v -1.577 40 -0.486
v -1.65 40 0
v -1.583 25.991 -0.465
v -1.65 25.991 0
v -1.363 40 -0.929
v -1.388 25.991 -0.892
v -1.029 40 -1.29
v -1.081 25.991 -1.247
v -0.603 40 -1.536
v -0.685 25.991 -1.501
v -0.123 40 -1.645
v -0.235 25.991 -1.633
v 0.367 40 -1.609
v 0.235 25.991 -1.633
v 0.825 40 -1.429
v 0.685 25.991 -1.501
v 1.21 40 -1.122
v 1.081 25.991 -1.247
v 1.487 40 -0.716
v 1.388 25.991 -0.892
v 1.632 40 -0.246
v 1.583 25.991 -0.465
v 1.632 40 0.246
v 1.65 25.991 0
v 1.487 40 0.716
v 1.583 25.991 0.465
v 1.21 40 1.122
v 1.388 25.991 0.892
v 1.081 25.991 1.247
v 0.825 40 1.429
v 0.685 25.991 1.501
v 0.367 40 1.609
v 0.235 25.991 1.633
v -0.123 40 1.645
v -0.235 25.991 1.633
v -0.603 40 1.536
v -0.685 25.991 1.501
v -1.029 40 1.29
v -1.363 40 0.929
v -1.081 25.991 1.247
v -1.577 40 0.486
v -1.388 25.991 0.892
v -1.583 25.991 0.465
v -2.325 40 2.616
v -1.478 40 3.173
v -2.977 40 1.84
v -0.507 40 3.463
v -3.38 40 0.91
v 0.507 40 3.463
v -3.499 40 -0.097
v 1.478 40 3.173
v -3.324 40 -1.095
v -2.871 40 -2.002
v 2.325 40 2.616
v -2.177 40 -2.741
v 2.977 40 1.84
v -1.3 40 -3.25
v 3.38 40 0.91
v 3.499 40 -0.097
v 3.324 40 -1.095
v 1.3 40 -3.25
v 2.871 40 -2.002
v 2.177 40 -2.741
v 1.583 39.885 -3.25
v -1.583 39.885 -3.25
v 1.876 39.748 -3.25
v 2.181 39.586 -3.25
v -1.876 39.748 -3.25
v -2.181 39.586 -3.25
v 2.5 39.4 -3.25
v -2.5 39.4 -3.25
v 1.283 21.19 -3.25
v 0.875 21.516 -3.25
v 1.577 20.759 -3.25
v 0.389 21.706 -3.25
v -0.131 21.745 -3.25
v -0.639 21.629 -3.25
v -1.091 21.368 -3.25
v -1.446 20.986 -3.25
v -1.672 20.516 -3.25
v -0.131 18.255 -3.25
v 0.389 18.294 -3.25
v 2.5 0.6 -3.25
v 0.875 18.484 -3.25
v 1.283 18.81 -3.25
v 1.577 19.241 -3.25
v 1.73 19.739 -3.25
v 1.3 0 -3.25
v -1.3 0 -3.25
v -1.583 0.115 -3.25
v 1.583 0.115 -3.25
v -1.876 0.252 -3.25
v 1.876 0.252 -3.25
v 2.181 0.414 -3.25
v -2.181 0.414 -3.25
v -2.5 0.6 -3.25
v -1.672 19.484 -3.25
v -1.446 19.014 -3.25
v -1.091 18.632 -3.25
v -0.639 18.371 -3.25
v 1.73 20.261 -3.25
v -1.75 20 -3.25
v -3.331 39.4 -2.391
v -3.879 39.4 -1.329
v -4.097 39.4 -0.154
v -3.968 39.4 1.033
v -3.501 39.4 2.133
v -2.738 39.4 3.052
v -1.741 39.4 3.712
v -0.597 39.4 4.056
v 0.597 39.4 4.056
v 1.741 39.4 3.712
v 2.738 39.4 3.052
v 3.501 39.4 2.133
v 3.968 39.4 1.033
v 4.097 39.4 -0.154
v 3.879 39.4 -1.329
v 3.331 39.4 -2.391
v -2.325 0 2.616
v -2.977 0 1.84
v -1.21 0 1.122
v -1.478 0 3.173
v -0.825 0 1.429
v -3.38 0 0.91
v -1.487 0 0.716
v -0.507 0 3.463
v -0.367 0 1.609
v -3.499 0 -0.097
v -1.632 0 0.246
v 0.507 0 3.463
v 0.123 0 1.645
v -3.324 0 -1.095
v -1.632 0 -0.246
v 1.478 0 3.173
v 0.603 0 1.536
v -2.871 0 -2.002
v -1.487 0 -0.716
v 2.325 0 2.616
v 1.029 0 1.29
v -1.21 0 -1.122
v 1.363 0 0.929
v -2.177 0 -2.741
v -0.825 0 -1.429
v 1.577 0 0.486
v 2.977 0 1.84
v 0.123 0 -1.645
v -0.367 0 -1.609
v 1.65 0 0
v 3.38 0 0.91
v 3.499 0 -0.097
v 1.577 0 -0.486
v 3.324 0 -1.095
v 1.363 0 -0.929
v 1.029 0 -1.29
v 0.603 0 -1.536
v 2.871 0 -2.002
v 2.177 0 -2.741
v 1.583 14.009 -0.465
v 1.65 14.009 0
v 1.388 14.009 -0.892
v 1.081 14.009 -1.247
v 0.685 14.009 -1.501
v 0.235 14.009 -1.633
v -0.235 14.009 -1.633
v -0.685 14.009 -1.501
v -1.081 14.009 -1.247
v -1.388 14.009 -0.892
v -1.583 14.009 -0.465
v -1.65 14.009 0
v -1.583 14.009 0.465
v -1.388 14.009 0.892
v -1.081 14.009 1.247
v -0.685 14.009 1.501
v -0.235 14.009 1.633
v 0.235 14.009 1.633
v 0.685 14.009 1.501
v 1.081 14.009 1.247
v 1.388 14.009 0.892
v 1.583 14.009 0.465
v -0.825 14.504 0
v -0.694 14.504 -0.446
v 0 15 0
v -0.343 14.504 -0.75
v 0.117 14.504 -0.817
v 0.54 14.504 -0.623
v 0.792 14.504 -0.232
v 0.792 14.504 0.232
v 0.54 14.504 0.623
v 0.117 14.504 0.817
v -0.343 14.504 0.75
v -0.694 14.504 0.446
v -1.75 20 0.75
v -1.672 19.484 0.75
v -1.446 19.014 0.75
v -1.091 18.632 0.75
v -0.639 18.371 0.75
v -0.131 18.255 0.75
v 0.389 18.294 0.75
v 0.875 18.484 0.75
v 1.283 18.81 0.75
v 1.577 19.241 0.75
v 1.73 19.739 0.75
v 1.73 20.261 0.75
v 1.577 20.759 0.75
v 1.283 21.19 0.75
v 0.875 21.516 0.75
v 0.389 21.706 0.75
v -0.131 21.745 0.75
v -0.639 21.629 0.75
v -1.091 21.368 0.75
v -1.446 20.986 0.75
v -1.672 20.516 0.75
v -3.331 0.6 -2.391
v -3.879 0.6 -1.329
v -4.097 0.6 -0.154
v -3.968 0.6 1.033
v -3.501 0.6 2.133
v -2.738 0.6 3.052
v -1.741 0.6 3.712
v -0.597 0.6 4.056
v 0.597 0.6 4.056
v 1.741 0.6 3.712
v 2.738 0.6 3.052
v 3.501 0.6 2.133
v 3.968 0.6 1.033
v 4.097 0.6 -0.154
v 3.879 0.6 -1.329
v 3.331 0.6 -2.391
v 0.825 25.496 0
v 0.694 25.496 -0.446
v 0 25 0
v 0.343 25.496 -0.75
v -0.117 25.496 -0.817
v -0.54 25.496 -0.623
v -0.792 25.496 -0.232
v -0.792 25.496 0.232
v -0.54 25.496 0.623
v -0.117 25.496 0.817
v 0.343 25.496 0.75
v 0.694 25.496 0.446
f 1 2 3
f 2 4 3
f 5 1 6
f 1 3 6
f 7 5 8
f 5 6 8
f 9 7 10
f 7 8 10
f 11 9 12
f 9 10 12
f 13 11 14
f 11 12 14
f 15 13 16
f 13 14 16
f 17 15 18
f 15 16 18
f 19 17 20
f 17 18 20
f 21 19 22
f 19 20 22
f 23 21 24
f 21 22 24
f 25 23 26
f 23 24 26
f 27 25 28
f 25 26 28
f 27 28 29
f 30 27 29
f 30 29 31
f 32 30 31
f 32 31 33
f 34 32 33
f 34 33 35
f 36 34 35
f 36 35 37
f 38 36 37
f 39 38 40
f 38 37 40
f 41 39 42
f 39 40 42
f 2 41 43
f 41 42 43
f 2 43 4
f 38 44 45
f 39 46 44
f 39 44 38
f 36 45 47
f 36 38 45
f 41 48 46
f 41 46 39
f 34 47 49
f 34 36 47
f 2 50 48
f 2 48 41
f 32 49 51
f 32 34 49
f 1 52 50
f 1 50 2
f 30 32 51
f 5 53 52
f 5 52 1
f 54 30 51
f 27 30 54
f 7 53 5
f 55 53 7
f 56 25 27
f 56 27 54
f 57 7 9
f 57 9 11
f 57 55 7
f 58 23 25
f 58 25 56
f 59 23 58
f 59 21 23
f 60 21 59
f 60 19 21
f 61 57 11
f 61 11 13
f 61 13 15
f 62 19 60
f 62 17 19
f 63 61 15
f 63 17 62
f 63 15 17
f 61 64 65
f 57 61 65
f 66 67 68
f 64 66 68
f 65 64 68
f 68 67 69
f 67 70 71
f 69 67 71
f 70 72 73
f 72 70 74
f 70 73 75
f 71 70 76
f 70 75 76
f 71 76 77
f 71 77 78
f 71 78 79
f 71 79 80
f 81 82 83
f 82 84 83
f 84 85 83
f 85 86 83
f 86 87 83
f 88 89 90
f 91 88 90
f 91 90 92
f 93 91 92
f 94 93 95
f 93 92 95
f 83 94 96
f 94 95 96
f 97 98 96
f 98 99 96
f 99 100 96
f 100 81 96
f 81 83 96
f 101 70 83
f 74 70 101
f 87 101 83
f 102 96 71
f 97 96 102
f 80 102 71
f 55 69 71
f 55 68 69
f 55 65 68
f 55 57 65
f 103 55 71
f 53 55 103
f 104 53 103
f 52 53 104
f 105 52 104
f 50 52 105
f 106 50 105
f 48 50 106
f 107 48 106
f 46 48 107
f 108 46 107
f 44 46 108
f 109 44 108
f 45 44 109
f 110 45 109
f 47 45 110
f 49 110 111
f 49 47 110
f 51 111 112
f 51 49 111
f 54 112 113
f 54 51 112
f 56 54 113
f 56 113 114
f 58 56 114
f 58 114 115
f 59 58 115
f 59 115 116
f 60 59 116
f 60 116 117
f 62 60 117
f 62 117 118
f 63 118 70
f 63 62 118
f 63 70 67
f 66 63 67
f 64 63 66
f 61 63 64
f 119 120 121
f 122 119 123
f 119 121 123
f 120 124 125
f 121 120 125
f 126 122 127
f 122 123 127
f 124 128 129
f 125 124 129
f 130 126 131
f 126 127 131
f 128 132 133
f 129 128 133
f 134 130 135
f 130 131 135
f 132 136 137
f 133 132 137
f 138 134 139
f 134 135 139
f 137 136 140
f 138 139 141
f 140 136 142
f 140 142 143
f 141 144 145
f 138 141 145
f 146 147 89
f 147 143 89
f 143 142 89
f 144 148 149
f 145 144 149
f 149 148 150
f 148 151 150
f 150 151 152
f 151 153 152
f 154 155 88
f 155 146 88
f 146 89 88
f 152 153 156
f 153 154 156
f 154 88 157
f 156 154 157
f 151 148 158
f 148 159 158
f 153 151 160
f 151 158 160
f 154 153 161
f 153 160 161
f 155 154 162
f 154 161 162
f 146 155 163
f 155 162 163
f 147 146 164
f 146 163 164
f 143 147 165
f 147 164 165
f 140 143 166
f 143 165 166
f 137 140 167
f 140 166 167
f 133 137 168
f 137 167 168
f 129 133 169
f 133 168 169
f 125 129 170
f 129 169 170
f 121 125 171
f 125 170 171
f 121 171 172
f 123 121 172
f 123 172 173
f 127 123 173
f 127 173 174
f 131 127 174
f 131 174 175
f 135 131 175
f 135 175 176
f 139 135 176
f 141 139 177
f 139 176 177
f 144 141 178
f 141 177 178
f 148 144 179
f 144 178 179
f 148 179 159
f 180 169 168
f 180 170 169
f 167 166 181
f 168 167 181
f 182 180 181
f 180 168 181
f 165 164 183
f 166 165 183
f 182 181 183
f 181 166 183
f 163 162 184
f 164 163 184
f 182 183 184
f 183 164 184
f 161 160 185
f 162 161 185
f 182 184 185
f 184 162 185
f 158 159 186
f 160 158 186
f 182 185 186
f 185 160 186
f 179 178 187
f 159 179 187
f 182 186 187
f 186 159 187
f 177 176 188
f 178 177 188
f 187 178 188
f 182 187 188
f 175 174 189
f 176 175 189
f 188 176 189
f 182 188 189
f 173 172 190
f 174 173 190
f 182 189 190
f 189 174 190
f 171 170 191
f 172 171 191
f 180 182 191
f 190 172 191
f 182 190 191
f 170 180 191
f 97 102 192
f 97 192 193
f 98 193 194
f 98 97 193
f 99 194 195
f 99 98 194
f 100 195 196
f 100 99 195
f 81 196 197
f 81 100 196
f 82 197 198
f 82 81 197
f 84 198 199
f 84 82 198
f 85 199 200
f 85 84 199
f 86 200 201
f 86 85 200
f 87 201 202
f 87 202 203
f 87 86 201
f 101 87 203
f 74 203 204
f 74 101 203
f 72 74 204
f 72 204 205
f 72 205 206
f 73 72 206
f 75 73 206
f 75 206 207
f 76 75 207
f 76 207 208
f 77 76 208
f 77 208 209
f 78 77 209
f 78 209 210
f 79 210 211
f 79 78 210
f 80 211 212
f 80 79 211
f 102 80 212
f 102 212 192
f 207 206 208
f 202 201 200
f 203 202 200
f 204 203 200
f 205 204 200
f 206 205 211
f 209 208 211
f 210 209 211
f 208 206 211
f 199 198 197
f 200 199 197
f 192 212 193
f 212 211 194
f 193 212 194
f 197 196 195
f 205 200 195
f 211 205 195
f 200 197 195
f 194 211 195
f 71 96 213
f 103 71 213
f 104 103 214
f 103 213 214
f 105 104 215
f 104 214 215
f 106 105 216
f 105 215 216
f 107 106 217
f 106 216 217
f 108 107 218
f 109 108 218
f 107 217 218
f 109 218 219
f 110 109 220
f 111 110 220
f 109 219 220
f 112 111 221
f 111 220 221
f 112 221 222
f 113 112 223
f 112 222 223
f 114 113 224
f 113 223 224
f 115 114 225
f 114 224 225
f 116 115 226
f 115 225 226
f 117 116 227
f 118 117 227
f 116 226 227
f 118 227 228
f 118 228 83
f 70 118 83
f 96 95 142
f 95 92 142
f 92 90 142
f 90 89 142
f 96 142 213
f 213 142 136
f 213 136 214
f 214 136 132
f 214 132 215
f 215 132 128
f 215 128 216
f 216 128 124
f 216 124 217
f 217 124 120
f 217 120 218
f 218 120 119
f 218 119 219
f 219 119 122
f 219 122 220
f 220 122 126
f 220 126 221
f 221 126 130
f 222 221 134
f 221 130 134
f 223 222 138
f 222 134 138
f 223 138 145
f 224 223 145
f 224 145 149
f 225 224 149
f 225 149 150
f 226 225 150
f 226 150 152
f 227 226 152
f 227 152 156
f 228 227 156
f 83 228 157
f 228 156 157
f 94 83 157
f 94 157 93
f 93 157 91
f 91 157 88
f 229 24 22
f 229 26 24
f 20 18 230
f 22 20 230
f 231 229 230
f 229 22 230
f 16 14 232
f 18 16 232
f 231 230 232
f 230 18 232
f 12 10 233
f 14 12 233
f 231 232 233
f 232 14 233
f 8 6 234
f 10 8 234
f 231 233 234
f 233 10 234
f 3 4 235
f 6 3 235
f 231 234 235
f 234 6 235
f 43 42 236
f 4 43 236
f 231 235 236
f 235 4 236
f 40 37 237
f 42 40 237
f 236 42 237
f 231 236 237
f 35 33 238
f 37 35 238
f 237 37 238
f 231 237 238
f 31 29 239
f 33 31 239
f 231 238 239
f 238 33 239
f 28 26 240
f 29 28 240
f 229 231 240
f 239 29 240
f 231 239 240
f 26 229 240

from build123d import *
from OCP.BRepAlgoAPI import BRepAlgoAPI_Cut
from OCP.TopTools import TopTools_ListOfShape

# Parameters (mm, degrees)
BOSS_EXTRUDE2_DEPTH       = 40
CUT_EXTRUDE1_START        = -7.349615
SKETCH2_R                 = 1.75
CUT_EXTRUDE1_DEPTH        = 4
F_1_0MM_DOWEL_HOLE1_D     = 3.3
F_1_0MM_DOWEL_HOLE1_DEPTH = 14.008579979
F_1_0MM_DOWEL_HOLE1_TIP   = 0.991420021
F_1_0MM_DOWEL_HOLE2_D     = 3.3
F_1_0MM_DOWEL_HOLE2_DEPTH = 14.008579979
F_1_0MM_DOWEL_HOLE2_TIP   = 0.991420021
CHAMFER1_SIZE             = 0.6
CHAMFER2_SIZE             = 0.6


with BuildPart() as part:
    # Sketch1 → Boss-Extrude2 (new body)
    with BuildSketch(Plane(origin=(0, 0, 0), x_dir=(1, 0, 0), z_dir=(0, 1, 0))):
        with BuildLine():
            Line((2.5, 3.249615362), (-2.5, 3.249615362))
            ThreePointArc((-2.5, 3.249615362), (0, -4.1), (2.5, 3.249615362))
        make_face()
    extrude(amount=BOSS_EXTRUDE2_DEPTH)


with BuildPart() as cut_extrude1_tool:
    # Sketch2 → Cut-Extrude1 (new body)
    with BuildSketch(Plane.XY.offset(4.1).offset(CUT_EXTRUDE1_START)):
        with Locations(Location((0, 20, 0), (0, 0, 180))):
            Circle(SKETCH2_R)
    extrude(amount=CUT_EXTRUDE1_DEPTH)


with BuildPart() as part_1:
    add(part.part)

    # Cut-Extrude1: cut by cut_extrude1_tool, with a tolerance
    cut_extrude1_stock = TopTools_ListOfShape()
    cut_extrude1_stock.Append(part_1.part.wrapped)
    cut_extrude1_tools = TopTools_ListOfShape()
    cut_extrude1_tools.Append(cut_extrude1_tool.part.wrapped)
    cut_extrude1_cut = BRepAlgoAPI_Cut()
    cut_extrude1_cut.SetArguments(cut_extrude1_stock)
    cut_extrude1_cut.SetTools(cut_extrude1_tools)
    cut_extrude1_cut.SetFuzzyValue(0.00001)
    cut_extrude1_cut.Build()
    add(Compound.cast(cut_extrude1_cut.Shape()).solids(), mode=Mode.REPLACE)

    # Ø1.0mm Dowel Hole1
    with Locations(Plane(origin=(0, 40, 0), x_dir=(1, 0, 0), z_dir=(0, 1, 0))):
        with Locations((0, 0)):
            Hole(F_1_0MM_DOWEL_HOLE1_D / 2, depth=F_1_0MM_DOWEL_HOLE1_DEPTH)
            with Locations((0, 0, -(F_1_0MM_DOWEL_HOLE1_DEPTH + F_1_0MM_DOWEL_HOLE1_TIP / 2))):  # 118° drill point
                Cone(0, F_1_0MM_DOWEL_HOLE1_D / 2, F_1_0MM_DOWEL_HOLE1_TIP, mode=Mode.SUBTRACT)

    # Ø1.0mm Dowel Hole2
    with Locations(Plane(origin=(0, 0, 0), x_dir=(-1, 0, 0), z_dir=(0, -1, 0))):
        with Locations((0, 0)):
            Hole(F_1_0MM_DOWEL_HOLE2_D / 2, depth=F_1_0MM_DOWEL_HOLE2_DEPTH)
            with Locations((0, 0, -(F_1_0MM_DOWEL_HOLE2_DEPTH + F_1_0MM_DOWEL_HOLE2_TIP / 2))):  # 118° drill point
                Cone(0, F_1_0MM_DOWEL_HOLE2_D / 2, F_1_0MM_DOWEL_HOLE2_TIP, mode=Mode.SUBTRACT)

    # Chamfer1
    chamfer1_edges = [part_1.edges().sort_by_distance(p)[0] for p in [
        (0, 40, 4.1),
    ]]
    chamfer(chamfer1_edges, length=CHAMFER1_SIZE)

    # Chamfer2
    chamfer2_edges = [part_1.edges().sort_by_distance(p)[0] for p in [
        (0, 0, 4.1),
    ]]
    chamfer(chamfer2_edges, length=CHAMFER2_SIZE)


solid = part_1.part
